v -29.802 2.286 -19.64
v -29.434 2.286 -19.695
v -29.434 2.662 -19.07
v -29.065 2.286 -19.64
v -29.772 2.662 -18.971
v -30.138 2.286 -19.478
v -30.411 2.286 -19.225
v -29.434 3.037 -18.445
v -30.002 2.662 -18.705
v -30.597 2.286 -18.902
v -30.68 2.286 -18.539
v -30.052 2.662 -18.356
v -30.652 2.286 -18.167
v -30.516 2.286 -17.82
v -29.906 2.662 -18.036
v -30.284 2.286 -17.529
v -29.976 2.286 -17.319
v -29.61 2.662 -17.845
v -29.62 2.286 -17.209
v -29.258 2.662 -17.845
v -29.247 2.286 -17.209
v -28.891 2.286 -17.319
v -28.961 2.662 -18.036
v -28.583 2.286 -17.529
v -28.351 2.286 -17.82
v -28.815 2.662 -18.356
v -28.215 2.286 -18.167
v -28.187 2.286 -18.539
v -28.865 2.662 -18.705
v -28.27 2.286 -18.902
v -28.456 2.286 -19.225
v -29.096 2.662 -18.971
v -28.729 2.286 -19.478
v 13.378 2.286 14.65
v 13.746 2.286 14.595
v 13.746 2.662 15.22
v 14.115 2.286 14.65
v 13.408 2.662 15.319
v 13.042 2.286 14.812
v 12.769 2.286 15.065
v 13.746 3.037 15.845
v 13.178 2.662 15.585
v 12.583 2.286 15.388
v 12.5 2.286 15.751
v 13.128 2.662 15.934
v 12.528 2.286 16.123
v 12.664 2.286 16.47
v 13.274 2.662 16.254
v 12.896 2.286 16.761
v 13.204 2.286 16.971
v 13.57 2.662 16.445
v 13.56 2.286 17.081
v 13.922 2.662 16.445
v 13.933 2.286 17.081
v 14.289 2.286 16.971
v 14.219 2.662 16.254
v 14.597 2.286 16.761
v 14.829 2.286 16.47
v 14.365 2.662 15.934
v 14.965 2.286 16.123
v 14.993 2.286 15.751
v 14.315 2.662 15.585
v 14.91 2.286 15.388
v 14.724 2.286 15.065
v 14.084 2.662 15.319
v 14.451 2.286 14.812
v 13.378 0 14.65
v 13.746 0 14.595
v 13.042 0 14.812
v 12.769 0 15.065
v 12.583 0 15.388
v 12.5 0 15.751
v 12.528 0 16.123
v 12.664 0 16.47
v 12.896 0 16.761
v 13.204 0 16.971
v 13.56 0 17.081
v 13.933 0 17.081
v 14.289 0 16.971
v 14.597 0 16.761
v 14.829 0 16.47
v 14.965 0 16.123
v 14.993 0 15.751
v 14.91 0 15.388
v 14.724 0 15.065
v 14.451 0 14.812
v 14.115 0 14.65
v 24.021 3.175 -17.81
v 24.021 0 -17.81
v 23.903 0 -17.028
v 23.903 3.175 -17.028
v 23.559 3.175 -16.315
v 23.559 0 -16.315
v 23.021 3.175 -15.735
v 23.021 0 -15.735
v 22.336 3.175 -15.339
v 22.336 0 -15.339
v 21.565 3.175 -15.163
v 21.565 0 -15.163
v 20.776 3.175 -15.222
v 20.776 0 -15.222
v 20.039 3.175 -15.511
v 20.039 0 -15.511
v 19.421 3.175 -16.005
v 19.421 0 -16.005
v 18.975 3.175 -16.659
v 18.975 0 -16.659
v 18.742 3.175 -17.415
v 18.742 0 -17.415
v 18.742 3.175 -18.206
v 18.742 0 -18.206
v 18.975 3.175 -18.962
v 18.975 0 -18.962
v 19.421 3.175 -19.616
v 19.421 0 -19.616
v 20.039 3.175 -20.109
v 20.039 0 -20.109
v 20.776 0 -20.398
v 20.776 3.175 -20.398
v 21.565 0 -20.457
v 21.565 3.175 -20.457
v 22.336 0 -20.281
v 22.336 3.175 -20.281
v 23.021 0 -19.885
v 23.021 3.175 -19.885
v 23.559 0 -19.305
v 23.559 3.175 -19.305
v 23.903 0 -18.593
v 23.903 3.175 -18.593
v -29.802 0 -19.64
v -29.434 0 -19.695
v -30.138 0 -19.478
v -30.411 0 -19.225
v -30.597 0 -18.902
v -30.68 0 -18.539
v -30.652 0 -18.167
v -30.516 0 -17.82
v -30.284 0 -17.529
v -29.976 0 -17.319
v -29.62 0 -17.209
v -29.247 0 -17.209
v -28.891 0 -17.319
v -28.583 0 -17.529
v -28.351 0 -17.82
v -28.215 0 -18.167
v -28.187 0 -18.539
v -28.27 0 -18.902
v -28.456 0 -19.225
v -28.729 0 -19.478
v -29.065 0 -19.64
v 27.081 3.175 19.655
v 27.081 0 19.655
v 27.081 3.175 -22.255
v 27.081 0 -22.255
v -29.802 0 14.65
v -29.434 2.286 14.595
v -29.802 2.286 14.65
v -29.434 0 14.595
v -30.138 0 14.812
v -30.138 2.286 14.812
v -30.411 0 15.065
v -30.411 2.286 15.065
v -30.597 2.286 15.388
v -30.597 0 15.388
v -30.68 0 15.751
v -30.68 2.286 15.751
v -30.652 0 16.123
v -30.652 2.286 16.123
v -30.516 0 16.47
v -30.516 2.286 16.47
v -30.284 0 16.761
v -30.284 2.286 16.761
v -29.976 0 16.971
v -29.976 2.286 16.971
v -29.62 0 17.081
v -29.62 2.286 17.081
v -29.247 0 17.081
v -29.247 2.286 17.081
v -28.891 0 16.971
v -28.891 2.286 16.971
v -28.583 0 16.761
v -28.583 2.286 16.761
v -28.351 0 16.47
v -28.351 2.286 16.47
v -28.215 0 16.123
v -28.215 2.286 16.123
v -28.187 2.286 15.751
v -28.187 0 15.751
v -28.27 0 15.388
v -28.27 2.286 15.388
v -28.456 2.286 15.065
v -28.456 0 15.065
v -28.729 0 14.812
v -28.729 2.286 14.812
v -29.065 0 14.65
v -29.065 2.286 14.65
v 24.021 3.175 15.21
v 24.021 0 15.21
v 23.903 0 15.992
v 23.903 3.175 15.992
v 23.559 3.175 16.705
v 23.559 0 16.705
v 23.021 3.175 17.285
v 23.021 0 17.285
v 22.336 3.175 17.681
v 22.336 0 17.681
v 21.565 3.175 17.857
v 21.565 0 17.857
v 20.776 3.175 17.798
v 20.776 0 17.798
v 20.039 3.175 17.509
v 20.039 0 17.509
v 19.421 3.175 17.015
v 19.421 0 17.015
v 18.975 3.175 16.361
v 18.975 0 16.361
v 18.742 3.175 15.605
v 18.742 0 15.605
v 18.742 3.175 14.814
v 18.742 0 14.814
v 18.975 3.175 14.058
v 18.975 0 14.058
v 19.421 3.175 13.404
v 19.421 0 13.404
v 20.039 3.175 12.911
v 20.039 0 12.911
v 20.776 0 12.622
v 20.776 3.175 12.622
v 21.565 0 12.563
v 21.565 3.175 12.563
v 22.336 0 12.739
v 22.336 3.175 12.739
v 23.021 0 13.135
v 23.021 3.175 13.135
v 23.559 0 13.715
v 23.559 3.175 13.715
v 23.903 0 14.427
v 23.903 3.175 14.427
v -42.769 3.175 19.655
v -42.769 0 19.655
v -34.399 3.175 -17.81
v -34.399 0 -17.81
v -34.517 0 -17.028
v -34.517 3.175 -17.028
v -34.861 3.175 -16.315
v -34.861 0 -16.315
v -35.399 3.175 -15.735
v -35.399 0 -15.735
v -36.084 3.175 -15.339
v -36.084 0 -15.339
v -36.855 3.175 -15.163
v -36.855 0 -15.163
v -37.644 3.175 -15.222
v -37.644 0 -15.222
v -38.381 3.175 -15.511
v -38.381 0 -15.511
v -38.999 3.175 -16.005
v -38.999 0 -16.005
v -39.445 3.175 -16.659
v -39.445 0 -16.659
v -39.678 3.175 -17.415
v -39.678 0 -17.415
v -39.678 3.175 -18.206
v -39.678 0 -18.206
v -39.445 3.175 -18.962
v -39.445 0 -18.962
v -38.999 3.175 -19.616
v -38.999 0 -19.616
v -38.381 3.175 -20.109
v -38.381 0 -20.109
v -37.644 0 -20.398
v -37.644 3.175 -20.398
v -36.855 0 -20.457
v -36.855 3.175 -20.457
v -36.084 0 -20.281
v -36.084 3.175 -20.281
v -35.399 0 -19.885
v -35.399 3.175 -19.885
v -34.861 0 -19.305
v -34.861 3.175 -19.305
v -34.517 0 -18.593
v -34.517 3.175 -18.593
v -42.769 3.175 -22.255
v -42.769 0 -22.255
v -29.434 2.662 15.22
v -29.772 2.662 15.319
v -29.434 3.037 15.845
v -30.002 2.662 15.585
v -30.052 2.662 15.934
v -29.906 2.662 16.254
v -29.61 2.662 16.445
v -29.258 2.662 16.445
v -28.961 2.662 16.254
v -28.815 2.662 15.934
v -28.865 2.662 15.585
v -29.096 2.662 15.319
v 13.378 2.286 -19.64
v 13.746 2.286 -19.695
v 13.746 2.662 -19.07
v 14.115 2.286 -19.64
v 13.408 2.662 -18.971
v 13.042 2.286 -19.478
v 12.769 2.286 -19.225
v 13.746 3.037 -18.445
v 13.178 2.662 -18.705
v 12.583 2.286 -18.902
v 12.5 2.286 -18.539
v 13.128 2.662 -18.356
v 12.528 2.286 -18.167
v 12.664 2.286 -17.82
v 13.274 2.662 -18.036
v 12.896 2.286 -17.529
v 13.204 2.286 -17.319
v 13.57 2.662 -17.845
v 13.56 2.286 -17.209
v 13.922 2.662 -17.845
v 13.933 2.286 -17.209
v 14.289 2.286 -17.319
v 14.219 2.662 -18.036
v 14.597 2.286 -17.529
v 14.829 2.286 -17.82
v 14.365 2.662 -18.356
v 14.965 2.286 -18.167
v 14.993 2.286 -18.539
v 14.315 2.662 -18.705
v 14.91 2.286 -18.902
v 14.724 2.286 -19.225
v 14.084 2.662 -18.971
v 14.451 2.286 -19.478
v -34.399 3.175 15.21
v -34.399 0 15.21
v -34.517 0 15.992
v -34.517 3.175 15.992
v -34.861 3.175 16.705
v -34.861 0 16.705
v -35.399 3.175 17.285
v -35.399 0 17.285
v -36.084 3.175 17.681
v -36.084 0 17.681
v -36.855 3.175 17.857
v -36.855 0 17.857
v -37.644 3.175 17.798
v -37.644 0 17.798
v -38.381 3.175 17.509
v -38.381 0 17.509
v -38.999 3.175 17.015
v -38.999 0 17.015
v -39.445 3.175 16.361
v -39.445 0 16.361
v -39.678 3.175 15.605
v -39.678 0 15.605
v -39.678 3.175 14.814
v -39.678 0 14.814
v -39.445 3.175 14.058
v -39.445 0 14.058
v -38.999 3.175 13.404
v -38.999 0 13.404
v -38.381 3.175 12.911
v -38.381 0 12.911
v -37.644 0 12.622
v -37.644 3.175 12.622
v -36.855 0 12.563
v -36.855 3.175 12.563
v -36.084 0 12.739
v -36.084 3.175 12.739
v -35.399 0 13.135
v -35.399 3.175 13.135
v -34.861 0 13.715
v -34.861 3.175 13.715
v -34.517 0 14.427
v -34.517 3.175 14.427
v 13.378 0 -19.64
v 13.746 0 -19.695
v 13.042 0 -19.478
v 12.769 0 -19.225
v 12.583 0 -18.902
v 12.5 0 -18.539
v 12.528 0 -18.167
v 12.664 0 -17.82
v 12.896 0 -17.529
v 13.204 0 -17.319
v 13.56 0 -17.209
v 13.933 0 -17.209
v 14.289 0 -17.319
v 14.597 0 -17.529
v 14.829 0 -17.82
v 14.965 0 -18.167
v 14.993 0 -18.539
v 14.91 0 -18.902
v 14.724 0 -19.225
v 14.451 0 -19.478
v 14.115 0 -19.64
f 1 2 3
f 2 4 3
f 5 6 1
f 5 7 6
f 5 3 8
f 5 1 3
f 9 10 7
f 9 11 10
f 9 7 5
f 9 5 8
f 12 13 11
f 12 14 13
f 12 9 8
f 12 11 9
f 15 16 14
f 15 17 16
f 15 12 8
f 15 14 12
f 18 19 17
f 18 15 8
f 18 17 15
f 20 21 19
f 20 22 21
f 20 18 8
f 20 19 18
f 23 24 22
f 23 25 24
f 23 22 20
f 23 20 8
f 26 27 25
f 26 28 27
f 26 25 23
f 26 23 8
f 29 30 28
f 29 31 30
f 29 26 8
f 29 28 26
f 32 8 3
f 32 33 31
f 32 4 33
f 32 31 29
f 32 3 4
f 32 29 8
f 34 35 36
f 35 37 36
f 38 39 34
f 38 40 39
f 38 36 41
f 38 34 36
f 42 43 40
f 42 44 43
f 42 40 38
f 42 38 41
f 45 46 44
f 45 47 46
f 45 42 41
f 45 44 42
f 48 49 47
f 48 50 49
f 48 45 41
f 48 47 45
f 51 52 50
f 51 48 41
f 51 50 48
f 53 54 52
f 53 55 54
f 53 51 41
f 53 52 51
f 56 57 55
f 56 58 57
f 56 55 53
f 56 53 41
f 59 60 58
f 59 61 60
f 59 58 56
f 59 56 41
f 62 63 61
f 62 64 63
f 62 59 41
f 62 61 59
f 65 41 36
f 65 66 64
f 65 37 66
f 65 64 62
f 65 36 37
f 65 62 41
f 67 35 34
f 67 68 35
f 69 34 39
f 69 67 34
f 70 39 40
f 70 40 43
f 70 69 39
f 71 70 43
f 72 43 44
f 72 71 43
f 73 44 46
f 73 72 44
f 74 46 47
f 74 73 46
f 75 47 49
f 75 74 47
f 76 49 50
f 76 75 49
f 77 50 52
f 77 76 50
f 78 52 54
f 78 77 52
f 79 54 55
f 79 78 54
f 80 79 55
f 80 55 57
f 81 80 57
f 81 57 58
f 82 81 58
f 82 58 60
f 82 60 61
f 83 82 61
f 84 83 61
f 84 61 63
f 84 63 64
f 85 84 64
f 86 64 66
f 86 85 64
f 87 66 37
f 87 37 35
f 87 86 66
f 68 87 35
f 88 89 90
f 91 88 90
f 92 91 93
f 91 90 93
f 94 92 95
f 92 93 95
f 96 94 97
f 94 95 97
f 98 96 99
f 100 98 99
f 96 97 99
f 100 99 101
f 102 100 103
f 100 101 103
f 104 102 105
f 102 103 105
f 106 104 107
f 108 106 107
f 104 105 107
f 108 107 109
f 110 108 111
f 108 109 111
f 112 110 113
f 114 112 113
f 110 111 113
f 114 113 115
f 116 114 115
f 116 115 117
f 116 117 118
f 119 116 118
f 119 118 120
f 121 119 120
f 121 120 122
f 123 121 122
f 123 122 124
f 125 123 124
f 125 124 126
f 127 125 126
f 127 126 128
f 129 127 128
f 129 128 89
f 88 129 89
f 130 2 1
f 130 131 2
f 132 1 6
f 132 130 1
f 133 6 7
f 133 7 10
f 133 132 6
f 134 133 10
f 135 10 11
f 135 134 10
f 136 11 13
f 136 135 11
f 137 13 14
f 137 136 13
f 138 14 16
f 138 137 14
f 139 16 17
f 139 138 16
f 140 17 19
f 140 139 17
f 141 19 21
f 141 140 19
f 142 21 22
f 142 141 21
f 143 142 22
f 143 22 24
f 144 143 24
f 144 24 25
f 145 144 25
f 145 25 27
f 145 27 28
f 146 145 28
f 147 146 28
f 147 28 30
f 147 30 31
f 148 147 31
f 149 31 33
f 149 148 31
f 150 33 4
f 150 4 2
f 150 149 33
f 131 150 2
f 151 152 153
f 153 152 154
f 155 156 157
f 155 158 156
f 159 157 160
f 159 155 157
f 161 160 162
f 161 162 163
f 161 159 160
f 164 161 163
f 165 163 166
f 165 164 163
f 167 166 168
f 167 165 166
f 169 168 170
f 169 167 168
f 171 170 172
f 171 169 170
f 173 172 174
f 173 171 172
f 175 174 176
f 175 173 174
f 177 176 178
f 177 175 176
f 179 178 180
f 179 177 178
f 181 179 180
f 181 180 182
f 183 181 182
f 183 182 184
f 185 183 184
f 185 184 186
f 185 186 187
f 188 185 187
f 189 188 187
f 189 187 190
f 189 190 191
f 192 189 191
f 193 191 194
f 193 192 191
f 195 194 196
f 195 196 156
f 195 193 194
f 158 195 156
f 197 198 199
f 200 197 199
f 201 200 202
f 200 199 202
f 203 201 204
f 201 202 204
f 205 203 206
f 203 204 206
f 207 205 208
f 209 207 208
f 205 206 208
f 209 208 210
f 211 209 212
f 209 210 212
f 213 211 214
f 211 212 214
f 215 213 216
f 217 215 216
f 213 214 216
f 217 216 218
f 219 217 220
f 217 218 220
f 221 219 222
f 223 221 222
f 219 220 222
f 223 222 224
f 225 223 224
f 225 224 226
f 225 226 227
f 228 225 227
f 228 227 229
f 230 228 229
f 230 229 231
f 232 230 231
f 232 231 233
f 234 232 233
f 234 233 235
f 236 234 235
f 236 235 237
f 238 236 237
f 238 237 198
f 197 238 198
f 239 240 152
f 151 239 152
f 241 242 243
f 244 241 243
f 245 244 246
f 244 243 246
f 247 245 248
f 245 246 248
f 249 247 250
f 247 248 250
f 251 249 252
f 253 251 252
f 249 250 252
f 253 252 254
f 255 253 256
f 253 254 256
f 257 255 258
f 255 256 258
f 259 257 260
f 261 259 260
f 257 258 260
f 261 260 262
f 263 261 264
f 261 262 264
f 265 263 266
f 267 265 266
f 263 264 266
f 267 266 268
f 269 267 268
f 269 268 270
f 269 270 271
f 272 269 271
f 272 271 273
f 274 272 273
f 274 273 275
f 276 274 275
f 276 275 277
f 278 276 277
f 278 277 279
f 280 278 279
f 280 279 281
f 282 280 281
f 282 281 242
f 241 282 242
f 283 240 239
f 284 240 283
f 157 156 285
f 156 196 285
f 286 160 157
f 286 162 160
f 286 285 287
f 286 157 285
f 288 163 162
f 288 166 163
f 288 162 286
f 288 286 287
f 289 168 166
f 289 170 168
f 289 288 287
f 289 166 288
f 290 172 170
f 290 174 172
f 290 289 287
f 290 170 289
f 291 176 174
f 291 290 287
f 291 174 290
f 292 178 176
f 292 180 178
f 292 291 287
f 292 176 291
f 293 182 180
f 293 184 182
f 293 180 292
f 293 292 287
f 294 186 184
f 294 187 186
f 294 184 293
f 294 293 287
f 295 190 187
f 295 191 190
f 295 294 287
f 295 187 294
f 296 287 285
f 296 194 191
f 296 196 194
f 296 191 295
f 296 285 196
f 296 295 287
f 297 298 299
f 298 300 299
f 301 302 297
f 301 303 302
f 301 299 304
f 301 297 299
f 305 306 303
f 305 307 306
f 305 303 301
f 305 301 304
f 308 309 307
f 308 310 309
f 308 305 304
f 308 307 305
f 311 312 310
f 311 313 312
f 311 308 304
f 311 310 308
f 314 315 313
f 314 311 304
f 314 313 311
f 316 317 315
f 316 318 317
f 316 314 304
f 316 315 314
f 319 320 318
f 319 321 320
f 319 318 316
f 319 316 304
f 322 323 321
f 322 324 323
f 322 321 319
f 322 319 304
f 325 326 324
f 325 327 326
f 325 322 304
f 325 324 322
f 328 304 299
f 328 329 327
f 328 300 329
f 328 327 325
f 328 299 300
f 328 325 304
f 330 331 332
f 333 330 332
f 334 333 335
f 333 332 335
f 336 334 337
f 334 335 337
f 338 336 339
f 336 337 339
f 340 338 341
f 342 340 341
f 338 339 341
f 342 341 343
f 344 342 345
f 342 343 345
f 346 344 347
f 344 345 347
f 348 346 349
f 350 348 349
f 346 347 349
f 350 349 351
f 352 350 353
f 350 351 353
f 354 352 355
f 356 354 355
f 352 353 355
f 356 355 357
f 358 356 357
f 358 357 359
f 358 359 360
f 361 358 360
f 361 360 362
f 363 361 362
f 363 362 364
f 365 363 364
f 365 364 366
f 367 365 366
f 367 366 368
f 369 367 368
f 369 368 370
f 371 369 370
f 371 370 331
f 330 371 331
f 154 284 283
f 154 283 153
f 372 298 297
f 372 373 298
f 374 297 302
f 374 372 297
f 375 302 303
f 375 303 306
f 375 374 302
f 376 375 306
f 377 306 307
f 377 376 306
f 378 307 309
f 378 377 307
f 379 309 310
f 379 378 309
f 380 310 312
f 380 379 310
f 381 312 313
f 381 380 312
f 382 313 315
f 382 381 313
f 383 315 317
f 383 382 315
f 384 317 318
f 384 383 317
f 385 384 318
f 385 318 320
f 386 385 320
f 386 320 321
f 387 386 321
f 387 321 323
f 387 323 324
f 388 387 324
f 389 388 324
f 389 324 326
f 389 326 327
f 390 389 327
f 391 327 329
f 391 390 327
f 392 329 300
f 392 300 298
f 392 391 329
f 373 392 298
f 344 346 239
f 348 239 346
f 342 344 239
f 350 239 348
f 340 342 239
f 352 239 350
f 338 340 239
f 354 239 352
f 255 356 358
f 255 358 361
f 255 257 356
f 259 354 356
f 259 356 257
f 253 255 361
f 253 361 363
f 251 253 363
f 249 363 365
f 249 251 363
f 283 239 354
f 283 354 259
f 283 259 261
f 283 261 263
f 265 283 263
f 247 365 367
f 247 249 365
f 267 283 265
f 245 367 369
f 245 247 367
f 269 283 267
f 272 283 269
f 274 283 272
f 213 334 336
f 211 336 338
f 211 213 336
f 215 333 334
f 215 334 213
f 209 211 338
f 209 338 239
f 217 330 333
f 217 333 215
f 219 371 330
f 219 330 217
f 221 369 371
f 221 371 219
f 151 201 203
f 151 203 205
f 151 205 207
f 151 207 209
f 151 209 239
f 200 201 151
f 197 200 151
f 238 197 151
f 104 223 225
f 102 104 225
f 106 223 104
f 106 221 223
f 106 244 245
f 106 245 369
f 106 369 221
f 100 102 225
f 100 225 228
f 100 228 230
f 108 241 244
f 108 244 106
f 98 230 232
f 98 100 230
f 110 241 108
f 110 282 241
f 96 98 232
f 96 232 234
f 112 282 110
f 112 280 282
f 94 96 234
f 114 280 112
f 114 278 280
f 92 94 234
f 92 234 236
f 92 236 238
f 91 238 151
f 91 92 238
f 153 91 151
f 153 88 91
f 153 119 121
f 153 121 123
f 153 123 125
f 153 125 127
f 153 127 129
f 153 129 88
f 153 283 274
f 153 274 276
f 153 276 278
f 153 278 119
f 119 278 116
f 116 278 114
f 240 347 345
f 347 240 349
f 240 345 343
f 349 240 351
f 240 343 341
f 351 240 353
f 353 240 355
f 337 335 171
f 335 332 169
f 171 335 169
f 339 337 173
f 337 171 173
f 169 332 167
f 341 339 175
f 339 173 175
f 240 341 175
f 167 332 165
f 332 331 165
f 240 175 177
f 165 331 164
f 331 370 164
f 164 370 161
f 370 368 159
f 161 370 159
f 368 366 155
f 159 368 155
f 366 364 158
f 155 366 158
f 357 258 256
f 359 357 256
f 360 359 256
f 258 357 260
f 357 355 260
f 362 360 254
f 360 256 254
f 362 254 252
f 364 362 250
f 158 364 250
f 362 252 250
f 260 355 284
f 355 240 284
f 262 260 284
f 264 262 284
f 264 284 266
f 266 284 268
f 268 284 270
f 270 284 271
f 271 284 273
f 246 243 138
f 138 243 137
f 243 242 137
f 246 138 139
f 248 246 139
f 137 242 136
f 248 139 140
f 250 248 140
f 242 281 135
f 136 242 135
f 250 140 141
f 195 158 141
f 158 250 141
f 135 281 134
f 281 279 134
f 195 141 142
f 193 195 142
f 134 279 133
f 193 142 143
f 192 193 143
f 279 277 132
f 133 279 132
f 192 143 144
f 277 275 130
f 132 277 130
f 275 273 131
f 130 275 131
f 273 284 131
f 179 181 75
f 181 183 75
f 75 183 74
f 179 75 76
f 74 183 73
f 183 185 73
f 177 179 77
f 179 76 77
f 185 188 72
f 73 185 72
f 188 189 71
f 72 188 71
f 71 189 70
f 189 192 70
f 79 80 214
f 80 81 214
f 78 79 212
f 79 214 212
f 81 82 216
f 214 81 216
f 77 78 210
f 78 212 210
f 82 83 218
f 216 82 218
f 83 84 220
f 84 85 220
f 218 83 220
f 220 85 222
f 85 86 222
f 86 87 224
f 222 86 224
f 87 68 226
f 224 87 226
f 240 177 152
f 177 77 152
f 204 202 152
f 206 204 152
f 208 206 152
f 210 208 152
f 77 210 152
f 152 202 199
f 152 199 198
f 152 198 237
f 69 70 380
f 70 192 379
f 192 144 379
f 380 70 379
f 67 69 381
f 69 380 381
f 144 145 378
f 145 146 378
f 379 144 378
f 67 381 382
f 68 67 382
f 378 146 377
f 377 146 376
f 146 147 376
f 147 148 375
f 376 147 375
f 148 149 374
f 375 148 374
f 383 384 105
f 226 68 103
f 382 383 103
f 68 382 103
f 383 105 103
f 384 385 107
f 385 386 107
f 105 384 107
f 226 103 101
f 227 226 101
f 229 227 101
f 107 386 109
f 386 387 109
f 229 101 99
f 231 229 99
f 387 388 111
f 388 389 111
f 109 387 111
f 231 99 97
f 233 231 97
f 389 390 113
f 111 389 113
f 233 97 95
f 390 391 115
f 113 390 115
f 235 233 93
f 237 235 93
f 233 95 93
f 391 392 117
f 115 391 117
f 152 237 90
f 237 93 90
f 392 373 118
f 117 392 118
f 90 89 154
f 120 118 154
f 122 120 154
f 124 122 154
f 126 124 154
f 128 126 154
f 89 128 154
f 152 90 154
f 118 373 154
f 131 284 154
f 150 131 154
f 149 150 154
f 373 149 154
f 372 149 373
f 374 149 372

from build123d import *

# Parameters (mm, degrees)
SKETCH1_W                            = 69.85
SKETCH1_H                            = 41.91
BOSS_EXTRUDE1_DEPTH                  = 3.175
F_SIZE_BIT_1_4_CLEARANCE_HOLE1_D     = 5.3086
F_SIZE_BIT_1_4_CLEARANCE_HOLE1_DEPTH = 12.7
F_SIZE_BIT_1_4_CLEARANCE_HOLE1_TIP   = 1.594864341
LPATTERN2_COUNT                      = 2
LPATTERN2_PITCH                      = 43.18
LPATTERN2_COUNT_DIR2                 = 2
LPATTERN2_PITCH_DIR2                 = 34.29


with BuildPart() as part:
    # Sketch1 → Boss-Extrude1 (new body)
    with BuildSketch(Plane(origin=(0, 0, 0), x_dir=(1, 0, 0), z_dir=(0, 1, 0))):
        with Locations((-7.843619051, 1.300163759)):
            Rectangle(SKETCH1_W, SKETCH1_H)
    extrude(amount=BOSS_EXTRUDE1_DEPTH)

    # F size bit 1/4 Clearance Hole1
    with Locations(Plane(origin=(0, 3.175, 0), x_dir=(-1, 0, 0), z_dir=(0, 1, 0))):
        with Locations((37.053619051, 15.209836241), (-21.366380949, 15.209836241), (-21.366380949, -17.810163759), (37.053619051, -17.810163759)):
            Hole(F_SIZE_BIT_1_4_CLEARANCE_HOLE1_D / 2, depth=F_SIZE_BIT_1_4_CLEARANCE_HOLE1_DEPTH)
            with Locations((0, 0, -(F_SIZE_BIT_1_4_CLEARANCE_HOLE1_DEPTH + F_SIZE_BIT_1_4_CLEARANCE_HOLE1_TIP / 2))):  # 118° drill point
                Cone(0, F_SIZE_BIT_1_4_CLEARANCE_HOLE1_D / 2, F_SIZE_BIT_1_4_CLEARANCE_HOLE1_TIP, mode=Mode.SUBTRACT)

    # Sketch14 → Tap Drill for M3x0.5 Tap1 (revolve, cut)
    with BuildSketch(Plane(origin=(-29.433619051, 0, 15.844836241), x_dir=(0, 0, -1), z_dir=(1, 0, 0))):
        Polygon((0, 0), (0, 3.037075774), (1.25, 2.286), (1.25, 0), align=None)
    tap_drill_for_m3x0_5_tap1 = revolve(axis=Axis((-29.433619051, -6.35, 15.844836241), (0, 1, 0)), mode=Mode.SUBTRACT)

    # LPattern2: Tap Drill for M3x0.5 Tap1 2 × 2
    with Locations(*[(i * LPATTERN2_PITCH, 0, -j * LPATTERN2_PITCH_DIR2) for i in range(LPATTERN2_COUNT) for j in range(LPATTERN2_COUNT_DIR2) if (i, j) != (0, 0)]):
        add(tap_drill_for_m3x0_5_tap1, mode=Mode.SUBTRACT)


solid = part.part
